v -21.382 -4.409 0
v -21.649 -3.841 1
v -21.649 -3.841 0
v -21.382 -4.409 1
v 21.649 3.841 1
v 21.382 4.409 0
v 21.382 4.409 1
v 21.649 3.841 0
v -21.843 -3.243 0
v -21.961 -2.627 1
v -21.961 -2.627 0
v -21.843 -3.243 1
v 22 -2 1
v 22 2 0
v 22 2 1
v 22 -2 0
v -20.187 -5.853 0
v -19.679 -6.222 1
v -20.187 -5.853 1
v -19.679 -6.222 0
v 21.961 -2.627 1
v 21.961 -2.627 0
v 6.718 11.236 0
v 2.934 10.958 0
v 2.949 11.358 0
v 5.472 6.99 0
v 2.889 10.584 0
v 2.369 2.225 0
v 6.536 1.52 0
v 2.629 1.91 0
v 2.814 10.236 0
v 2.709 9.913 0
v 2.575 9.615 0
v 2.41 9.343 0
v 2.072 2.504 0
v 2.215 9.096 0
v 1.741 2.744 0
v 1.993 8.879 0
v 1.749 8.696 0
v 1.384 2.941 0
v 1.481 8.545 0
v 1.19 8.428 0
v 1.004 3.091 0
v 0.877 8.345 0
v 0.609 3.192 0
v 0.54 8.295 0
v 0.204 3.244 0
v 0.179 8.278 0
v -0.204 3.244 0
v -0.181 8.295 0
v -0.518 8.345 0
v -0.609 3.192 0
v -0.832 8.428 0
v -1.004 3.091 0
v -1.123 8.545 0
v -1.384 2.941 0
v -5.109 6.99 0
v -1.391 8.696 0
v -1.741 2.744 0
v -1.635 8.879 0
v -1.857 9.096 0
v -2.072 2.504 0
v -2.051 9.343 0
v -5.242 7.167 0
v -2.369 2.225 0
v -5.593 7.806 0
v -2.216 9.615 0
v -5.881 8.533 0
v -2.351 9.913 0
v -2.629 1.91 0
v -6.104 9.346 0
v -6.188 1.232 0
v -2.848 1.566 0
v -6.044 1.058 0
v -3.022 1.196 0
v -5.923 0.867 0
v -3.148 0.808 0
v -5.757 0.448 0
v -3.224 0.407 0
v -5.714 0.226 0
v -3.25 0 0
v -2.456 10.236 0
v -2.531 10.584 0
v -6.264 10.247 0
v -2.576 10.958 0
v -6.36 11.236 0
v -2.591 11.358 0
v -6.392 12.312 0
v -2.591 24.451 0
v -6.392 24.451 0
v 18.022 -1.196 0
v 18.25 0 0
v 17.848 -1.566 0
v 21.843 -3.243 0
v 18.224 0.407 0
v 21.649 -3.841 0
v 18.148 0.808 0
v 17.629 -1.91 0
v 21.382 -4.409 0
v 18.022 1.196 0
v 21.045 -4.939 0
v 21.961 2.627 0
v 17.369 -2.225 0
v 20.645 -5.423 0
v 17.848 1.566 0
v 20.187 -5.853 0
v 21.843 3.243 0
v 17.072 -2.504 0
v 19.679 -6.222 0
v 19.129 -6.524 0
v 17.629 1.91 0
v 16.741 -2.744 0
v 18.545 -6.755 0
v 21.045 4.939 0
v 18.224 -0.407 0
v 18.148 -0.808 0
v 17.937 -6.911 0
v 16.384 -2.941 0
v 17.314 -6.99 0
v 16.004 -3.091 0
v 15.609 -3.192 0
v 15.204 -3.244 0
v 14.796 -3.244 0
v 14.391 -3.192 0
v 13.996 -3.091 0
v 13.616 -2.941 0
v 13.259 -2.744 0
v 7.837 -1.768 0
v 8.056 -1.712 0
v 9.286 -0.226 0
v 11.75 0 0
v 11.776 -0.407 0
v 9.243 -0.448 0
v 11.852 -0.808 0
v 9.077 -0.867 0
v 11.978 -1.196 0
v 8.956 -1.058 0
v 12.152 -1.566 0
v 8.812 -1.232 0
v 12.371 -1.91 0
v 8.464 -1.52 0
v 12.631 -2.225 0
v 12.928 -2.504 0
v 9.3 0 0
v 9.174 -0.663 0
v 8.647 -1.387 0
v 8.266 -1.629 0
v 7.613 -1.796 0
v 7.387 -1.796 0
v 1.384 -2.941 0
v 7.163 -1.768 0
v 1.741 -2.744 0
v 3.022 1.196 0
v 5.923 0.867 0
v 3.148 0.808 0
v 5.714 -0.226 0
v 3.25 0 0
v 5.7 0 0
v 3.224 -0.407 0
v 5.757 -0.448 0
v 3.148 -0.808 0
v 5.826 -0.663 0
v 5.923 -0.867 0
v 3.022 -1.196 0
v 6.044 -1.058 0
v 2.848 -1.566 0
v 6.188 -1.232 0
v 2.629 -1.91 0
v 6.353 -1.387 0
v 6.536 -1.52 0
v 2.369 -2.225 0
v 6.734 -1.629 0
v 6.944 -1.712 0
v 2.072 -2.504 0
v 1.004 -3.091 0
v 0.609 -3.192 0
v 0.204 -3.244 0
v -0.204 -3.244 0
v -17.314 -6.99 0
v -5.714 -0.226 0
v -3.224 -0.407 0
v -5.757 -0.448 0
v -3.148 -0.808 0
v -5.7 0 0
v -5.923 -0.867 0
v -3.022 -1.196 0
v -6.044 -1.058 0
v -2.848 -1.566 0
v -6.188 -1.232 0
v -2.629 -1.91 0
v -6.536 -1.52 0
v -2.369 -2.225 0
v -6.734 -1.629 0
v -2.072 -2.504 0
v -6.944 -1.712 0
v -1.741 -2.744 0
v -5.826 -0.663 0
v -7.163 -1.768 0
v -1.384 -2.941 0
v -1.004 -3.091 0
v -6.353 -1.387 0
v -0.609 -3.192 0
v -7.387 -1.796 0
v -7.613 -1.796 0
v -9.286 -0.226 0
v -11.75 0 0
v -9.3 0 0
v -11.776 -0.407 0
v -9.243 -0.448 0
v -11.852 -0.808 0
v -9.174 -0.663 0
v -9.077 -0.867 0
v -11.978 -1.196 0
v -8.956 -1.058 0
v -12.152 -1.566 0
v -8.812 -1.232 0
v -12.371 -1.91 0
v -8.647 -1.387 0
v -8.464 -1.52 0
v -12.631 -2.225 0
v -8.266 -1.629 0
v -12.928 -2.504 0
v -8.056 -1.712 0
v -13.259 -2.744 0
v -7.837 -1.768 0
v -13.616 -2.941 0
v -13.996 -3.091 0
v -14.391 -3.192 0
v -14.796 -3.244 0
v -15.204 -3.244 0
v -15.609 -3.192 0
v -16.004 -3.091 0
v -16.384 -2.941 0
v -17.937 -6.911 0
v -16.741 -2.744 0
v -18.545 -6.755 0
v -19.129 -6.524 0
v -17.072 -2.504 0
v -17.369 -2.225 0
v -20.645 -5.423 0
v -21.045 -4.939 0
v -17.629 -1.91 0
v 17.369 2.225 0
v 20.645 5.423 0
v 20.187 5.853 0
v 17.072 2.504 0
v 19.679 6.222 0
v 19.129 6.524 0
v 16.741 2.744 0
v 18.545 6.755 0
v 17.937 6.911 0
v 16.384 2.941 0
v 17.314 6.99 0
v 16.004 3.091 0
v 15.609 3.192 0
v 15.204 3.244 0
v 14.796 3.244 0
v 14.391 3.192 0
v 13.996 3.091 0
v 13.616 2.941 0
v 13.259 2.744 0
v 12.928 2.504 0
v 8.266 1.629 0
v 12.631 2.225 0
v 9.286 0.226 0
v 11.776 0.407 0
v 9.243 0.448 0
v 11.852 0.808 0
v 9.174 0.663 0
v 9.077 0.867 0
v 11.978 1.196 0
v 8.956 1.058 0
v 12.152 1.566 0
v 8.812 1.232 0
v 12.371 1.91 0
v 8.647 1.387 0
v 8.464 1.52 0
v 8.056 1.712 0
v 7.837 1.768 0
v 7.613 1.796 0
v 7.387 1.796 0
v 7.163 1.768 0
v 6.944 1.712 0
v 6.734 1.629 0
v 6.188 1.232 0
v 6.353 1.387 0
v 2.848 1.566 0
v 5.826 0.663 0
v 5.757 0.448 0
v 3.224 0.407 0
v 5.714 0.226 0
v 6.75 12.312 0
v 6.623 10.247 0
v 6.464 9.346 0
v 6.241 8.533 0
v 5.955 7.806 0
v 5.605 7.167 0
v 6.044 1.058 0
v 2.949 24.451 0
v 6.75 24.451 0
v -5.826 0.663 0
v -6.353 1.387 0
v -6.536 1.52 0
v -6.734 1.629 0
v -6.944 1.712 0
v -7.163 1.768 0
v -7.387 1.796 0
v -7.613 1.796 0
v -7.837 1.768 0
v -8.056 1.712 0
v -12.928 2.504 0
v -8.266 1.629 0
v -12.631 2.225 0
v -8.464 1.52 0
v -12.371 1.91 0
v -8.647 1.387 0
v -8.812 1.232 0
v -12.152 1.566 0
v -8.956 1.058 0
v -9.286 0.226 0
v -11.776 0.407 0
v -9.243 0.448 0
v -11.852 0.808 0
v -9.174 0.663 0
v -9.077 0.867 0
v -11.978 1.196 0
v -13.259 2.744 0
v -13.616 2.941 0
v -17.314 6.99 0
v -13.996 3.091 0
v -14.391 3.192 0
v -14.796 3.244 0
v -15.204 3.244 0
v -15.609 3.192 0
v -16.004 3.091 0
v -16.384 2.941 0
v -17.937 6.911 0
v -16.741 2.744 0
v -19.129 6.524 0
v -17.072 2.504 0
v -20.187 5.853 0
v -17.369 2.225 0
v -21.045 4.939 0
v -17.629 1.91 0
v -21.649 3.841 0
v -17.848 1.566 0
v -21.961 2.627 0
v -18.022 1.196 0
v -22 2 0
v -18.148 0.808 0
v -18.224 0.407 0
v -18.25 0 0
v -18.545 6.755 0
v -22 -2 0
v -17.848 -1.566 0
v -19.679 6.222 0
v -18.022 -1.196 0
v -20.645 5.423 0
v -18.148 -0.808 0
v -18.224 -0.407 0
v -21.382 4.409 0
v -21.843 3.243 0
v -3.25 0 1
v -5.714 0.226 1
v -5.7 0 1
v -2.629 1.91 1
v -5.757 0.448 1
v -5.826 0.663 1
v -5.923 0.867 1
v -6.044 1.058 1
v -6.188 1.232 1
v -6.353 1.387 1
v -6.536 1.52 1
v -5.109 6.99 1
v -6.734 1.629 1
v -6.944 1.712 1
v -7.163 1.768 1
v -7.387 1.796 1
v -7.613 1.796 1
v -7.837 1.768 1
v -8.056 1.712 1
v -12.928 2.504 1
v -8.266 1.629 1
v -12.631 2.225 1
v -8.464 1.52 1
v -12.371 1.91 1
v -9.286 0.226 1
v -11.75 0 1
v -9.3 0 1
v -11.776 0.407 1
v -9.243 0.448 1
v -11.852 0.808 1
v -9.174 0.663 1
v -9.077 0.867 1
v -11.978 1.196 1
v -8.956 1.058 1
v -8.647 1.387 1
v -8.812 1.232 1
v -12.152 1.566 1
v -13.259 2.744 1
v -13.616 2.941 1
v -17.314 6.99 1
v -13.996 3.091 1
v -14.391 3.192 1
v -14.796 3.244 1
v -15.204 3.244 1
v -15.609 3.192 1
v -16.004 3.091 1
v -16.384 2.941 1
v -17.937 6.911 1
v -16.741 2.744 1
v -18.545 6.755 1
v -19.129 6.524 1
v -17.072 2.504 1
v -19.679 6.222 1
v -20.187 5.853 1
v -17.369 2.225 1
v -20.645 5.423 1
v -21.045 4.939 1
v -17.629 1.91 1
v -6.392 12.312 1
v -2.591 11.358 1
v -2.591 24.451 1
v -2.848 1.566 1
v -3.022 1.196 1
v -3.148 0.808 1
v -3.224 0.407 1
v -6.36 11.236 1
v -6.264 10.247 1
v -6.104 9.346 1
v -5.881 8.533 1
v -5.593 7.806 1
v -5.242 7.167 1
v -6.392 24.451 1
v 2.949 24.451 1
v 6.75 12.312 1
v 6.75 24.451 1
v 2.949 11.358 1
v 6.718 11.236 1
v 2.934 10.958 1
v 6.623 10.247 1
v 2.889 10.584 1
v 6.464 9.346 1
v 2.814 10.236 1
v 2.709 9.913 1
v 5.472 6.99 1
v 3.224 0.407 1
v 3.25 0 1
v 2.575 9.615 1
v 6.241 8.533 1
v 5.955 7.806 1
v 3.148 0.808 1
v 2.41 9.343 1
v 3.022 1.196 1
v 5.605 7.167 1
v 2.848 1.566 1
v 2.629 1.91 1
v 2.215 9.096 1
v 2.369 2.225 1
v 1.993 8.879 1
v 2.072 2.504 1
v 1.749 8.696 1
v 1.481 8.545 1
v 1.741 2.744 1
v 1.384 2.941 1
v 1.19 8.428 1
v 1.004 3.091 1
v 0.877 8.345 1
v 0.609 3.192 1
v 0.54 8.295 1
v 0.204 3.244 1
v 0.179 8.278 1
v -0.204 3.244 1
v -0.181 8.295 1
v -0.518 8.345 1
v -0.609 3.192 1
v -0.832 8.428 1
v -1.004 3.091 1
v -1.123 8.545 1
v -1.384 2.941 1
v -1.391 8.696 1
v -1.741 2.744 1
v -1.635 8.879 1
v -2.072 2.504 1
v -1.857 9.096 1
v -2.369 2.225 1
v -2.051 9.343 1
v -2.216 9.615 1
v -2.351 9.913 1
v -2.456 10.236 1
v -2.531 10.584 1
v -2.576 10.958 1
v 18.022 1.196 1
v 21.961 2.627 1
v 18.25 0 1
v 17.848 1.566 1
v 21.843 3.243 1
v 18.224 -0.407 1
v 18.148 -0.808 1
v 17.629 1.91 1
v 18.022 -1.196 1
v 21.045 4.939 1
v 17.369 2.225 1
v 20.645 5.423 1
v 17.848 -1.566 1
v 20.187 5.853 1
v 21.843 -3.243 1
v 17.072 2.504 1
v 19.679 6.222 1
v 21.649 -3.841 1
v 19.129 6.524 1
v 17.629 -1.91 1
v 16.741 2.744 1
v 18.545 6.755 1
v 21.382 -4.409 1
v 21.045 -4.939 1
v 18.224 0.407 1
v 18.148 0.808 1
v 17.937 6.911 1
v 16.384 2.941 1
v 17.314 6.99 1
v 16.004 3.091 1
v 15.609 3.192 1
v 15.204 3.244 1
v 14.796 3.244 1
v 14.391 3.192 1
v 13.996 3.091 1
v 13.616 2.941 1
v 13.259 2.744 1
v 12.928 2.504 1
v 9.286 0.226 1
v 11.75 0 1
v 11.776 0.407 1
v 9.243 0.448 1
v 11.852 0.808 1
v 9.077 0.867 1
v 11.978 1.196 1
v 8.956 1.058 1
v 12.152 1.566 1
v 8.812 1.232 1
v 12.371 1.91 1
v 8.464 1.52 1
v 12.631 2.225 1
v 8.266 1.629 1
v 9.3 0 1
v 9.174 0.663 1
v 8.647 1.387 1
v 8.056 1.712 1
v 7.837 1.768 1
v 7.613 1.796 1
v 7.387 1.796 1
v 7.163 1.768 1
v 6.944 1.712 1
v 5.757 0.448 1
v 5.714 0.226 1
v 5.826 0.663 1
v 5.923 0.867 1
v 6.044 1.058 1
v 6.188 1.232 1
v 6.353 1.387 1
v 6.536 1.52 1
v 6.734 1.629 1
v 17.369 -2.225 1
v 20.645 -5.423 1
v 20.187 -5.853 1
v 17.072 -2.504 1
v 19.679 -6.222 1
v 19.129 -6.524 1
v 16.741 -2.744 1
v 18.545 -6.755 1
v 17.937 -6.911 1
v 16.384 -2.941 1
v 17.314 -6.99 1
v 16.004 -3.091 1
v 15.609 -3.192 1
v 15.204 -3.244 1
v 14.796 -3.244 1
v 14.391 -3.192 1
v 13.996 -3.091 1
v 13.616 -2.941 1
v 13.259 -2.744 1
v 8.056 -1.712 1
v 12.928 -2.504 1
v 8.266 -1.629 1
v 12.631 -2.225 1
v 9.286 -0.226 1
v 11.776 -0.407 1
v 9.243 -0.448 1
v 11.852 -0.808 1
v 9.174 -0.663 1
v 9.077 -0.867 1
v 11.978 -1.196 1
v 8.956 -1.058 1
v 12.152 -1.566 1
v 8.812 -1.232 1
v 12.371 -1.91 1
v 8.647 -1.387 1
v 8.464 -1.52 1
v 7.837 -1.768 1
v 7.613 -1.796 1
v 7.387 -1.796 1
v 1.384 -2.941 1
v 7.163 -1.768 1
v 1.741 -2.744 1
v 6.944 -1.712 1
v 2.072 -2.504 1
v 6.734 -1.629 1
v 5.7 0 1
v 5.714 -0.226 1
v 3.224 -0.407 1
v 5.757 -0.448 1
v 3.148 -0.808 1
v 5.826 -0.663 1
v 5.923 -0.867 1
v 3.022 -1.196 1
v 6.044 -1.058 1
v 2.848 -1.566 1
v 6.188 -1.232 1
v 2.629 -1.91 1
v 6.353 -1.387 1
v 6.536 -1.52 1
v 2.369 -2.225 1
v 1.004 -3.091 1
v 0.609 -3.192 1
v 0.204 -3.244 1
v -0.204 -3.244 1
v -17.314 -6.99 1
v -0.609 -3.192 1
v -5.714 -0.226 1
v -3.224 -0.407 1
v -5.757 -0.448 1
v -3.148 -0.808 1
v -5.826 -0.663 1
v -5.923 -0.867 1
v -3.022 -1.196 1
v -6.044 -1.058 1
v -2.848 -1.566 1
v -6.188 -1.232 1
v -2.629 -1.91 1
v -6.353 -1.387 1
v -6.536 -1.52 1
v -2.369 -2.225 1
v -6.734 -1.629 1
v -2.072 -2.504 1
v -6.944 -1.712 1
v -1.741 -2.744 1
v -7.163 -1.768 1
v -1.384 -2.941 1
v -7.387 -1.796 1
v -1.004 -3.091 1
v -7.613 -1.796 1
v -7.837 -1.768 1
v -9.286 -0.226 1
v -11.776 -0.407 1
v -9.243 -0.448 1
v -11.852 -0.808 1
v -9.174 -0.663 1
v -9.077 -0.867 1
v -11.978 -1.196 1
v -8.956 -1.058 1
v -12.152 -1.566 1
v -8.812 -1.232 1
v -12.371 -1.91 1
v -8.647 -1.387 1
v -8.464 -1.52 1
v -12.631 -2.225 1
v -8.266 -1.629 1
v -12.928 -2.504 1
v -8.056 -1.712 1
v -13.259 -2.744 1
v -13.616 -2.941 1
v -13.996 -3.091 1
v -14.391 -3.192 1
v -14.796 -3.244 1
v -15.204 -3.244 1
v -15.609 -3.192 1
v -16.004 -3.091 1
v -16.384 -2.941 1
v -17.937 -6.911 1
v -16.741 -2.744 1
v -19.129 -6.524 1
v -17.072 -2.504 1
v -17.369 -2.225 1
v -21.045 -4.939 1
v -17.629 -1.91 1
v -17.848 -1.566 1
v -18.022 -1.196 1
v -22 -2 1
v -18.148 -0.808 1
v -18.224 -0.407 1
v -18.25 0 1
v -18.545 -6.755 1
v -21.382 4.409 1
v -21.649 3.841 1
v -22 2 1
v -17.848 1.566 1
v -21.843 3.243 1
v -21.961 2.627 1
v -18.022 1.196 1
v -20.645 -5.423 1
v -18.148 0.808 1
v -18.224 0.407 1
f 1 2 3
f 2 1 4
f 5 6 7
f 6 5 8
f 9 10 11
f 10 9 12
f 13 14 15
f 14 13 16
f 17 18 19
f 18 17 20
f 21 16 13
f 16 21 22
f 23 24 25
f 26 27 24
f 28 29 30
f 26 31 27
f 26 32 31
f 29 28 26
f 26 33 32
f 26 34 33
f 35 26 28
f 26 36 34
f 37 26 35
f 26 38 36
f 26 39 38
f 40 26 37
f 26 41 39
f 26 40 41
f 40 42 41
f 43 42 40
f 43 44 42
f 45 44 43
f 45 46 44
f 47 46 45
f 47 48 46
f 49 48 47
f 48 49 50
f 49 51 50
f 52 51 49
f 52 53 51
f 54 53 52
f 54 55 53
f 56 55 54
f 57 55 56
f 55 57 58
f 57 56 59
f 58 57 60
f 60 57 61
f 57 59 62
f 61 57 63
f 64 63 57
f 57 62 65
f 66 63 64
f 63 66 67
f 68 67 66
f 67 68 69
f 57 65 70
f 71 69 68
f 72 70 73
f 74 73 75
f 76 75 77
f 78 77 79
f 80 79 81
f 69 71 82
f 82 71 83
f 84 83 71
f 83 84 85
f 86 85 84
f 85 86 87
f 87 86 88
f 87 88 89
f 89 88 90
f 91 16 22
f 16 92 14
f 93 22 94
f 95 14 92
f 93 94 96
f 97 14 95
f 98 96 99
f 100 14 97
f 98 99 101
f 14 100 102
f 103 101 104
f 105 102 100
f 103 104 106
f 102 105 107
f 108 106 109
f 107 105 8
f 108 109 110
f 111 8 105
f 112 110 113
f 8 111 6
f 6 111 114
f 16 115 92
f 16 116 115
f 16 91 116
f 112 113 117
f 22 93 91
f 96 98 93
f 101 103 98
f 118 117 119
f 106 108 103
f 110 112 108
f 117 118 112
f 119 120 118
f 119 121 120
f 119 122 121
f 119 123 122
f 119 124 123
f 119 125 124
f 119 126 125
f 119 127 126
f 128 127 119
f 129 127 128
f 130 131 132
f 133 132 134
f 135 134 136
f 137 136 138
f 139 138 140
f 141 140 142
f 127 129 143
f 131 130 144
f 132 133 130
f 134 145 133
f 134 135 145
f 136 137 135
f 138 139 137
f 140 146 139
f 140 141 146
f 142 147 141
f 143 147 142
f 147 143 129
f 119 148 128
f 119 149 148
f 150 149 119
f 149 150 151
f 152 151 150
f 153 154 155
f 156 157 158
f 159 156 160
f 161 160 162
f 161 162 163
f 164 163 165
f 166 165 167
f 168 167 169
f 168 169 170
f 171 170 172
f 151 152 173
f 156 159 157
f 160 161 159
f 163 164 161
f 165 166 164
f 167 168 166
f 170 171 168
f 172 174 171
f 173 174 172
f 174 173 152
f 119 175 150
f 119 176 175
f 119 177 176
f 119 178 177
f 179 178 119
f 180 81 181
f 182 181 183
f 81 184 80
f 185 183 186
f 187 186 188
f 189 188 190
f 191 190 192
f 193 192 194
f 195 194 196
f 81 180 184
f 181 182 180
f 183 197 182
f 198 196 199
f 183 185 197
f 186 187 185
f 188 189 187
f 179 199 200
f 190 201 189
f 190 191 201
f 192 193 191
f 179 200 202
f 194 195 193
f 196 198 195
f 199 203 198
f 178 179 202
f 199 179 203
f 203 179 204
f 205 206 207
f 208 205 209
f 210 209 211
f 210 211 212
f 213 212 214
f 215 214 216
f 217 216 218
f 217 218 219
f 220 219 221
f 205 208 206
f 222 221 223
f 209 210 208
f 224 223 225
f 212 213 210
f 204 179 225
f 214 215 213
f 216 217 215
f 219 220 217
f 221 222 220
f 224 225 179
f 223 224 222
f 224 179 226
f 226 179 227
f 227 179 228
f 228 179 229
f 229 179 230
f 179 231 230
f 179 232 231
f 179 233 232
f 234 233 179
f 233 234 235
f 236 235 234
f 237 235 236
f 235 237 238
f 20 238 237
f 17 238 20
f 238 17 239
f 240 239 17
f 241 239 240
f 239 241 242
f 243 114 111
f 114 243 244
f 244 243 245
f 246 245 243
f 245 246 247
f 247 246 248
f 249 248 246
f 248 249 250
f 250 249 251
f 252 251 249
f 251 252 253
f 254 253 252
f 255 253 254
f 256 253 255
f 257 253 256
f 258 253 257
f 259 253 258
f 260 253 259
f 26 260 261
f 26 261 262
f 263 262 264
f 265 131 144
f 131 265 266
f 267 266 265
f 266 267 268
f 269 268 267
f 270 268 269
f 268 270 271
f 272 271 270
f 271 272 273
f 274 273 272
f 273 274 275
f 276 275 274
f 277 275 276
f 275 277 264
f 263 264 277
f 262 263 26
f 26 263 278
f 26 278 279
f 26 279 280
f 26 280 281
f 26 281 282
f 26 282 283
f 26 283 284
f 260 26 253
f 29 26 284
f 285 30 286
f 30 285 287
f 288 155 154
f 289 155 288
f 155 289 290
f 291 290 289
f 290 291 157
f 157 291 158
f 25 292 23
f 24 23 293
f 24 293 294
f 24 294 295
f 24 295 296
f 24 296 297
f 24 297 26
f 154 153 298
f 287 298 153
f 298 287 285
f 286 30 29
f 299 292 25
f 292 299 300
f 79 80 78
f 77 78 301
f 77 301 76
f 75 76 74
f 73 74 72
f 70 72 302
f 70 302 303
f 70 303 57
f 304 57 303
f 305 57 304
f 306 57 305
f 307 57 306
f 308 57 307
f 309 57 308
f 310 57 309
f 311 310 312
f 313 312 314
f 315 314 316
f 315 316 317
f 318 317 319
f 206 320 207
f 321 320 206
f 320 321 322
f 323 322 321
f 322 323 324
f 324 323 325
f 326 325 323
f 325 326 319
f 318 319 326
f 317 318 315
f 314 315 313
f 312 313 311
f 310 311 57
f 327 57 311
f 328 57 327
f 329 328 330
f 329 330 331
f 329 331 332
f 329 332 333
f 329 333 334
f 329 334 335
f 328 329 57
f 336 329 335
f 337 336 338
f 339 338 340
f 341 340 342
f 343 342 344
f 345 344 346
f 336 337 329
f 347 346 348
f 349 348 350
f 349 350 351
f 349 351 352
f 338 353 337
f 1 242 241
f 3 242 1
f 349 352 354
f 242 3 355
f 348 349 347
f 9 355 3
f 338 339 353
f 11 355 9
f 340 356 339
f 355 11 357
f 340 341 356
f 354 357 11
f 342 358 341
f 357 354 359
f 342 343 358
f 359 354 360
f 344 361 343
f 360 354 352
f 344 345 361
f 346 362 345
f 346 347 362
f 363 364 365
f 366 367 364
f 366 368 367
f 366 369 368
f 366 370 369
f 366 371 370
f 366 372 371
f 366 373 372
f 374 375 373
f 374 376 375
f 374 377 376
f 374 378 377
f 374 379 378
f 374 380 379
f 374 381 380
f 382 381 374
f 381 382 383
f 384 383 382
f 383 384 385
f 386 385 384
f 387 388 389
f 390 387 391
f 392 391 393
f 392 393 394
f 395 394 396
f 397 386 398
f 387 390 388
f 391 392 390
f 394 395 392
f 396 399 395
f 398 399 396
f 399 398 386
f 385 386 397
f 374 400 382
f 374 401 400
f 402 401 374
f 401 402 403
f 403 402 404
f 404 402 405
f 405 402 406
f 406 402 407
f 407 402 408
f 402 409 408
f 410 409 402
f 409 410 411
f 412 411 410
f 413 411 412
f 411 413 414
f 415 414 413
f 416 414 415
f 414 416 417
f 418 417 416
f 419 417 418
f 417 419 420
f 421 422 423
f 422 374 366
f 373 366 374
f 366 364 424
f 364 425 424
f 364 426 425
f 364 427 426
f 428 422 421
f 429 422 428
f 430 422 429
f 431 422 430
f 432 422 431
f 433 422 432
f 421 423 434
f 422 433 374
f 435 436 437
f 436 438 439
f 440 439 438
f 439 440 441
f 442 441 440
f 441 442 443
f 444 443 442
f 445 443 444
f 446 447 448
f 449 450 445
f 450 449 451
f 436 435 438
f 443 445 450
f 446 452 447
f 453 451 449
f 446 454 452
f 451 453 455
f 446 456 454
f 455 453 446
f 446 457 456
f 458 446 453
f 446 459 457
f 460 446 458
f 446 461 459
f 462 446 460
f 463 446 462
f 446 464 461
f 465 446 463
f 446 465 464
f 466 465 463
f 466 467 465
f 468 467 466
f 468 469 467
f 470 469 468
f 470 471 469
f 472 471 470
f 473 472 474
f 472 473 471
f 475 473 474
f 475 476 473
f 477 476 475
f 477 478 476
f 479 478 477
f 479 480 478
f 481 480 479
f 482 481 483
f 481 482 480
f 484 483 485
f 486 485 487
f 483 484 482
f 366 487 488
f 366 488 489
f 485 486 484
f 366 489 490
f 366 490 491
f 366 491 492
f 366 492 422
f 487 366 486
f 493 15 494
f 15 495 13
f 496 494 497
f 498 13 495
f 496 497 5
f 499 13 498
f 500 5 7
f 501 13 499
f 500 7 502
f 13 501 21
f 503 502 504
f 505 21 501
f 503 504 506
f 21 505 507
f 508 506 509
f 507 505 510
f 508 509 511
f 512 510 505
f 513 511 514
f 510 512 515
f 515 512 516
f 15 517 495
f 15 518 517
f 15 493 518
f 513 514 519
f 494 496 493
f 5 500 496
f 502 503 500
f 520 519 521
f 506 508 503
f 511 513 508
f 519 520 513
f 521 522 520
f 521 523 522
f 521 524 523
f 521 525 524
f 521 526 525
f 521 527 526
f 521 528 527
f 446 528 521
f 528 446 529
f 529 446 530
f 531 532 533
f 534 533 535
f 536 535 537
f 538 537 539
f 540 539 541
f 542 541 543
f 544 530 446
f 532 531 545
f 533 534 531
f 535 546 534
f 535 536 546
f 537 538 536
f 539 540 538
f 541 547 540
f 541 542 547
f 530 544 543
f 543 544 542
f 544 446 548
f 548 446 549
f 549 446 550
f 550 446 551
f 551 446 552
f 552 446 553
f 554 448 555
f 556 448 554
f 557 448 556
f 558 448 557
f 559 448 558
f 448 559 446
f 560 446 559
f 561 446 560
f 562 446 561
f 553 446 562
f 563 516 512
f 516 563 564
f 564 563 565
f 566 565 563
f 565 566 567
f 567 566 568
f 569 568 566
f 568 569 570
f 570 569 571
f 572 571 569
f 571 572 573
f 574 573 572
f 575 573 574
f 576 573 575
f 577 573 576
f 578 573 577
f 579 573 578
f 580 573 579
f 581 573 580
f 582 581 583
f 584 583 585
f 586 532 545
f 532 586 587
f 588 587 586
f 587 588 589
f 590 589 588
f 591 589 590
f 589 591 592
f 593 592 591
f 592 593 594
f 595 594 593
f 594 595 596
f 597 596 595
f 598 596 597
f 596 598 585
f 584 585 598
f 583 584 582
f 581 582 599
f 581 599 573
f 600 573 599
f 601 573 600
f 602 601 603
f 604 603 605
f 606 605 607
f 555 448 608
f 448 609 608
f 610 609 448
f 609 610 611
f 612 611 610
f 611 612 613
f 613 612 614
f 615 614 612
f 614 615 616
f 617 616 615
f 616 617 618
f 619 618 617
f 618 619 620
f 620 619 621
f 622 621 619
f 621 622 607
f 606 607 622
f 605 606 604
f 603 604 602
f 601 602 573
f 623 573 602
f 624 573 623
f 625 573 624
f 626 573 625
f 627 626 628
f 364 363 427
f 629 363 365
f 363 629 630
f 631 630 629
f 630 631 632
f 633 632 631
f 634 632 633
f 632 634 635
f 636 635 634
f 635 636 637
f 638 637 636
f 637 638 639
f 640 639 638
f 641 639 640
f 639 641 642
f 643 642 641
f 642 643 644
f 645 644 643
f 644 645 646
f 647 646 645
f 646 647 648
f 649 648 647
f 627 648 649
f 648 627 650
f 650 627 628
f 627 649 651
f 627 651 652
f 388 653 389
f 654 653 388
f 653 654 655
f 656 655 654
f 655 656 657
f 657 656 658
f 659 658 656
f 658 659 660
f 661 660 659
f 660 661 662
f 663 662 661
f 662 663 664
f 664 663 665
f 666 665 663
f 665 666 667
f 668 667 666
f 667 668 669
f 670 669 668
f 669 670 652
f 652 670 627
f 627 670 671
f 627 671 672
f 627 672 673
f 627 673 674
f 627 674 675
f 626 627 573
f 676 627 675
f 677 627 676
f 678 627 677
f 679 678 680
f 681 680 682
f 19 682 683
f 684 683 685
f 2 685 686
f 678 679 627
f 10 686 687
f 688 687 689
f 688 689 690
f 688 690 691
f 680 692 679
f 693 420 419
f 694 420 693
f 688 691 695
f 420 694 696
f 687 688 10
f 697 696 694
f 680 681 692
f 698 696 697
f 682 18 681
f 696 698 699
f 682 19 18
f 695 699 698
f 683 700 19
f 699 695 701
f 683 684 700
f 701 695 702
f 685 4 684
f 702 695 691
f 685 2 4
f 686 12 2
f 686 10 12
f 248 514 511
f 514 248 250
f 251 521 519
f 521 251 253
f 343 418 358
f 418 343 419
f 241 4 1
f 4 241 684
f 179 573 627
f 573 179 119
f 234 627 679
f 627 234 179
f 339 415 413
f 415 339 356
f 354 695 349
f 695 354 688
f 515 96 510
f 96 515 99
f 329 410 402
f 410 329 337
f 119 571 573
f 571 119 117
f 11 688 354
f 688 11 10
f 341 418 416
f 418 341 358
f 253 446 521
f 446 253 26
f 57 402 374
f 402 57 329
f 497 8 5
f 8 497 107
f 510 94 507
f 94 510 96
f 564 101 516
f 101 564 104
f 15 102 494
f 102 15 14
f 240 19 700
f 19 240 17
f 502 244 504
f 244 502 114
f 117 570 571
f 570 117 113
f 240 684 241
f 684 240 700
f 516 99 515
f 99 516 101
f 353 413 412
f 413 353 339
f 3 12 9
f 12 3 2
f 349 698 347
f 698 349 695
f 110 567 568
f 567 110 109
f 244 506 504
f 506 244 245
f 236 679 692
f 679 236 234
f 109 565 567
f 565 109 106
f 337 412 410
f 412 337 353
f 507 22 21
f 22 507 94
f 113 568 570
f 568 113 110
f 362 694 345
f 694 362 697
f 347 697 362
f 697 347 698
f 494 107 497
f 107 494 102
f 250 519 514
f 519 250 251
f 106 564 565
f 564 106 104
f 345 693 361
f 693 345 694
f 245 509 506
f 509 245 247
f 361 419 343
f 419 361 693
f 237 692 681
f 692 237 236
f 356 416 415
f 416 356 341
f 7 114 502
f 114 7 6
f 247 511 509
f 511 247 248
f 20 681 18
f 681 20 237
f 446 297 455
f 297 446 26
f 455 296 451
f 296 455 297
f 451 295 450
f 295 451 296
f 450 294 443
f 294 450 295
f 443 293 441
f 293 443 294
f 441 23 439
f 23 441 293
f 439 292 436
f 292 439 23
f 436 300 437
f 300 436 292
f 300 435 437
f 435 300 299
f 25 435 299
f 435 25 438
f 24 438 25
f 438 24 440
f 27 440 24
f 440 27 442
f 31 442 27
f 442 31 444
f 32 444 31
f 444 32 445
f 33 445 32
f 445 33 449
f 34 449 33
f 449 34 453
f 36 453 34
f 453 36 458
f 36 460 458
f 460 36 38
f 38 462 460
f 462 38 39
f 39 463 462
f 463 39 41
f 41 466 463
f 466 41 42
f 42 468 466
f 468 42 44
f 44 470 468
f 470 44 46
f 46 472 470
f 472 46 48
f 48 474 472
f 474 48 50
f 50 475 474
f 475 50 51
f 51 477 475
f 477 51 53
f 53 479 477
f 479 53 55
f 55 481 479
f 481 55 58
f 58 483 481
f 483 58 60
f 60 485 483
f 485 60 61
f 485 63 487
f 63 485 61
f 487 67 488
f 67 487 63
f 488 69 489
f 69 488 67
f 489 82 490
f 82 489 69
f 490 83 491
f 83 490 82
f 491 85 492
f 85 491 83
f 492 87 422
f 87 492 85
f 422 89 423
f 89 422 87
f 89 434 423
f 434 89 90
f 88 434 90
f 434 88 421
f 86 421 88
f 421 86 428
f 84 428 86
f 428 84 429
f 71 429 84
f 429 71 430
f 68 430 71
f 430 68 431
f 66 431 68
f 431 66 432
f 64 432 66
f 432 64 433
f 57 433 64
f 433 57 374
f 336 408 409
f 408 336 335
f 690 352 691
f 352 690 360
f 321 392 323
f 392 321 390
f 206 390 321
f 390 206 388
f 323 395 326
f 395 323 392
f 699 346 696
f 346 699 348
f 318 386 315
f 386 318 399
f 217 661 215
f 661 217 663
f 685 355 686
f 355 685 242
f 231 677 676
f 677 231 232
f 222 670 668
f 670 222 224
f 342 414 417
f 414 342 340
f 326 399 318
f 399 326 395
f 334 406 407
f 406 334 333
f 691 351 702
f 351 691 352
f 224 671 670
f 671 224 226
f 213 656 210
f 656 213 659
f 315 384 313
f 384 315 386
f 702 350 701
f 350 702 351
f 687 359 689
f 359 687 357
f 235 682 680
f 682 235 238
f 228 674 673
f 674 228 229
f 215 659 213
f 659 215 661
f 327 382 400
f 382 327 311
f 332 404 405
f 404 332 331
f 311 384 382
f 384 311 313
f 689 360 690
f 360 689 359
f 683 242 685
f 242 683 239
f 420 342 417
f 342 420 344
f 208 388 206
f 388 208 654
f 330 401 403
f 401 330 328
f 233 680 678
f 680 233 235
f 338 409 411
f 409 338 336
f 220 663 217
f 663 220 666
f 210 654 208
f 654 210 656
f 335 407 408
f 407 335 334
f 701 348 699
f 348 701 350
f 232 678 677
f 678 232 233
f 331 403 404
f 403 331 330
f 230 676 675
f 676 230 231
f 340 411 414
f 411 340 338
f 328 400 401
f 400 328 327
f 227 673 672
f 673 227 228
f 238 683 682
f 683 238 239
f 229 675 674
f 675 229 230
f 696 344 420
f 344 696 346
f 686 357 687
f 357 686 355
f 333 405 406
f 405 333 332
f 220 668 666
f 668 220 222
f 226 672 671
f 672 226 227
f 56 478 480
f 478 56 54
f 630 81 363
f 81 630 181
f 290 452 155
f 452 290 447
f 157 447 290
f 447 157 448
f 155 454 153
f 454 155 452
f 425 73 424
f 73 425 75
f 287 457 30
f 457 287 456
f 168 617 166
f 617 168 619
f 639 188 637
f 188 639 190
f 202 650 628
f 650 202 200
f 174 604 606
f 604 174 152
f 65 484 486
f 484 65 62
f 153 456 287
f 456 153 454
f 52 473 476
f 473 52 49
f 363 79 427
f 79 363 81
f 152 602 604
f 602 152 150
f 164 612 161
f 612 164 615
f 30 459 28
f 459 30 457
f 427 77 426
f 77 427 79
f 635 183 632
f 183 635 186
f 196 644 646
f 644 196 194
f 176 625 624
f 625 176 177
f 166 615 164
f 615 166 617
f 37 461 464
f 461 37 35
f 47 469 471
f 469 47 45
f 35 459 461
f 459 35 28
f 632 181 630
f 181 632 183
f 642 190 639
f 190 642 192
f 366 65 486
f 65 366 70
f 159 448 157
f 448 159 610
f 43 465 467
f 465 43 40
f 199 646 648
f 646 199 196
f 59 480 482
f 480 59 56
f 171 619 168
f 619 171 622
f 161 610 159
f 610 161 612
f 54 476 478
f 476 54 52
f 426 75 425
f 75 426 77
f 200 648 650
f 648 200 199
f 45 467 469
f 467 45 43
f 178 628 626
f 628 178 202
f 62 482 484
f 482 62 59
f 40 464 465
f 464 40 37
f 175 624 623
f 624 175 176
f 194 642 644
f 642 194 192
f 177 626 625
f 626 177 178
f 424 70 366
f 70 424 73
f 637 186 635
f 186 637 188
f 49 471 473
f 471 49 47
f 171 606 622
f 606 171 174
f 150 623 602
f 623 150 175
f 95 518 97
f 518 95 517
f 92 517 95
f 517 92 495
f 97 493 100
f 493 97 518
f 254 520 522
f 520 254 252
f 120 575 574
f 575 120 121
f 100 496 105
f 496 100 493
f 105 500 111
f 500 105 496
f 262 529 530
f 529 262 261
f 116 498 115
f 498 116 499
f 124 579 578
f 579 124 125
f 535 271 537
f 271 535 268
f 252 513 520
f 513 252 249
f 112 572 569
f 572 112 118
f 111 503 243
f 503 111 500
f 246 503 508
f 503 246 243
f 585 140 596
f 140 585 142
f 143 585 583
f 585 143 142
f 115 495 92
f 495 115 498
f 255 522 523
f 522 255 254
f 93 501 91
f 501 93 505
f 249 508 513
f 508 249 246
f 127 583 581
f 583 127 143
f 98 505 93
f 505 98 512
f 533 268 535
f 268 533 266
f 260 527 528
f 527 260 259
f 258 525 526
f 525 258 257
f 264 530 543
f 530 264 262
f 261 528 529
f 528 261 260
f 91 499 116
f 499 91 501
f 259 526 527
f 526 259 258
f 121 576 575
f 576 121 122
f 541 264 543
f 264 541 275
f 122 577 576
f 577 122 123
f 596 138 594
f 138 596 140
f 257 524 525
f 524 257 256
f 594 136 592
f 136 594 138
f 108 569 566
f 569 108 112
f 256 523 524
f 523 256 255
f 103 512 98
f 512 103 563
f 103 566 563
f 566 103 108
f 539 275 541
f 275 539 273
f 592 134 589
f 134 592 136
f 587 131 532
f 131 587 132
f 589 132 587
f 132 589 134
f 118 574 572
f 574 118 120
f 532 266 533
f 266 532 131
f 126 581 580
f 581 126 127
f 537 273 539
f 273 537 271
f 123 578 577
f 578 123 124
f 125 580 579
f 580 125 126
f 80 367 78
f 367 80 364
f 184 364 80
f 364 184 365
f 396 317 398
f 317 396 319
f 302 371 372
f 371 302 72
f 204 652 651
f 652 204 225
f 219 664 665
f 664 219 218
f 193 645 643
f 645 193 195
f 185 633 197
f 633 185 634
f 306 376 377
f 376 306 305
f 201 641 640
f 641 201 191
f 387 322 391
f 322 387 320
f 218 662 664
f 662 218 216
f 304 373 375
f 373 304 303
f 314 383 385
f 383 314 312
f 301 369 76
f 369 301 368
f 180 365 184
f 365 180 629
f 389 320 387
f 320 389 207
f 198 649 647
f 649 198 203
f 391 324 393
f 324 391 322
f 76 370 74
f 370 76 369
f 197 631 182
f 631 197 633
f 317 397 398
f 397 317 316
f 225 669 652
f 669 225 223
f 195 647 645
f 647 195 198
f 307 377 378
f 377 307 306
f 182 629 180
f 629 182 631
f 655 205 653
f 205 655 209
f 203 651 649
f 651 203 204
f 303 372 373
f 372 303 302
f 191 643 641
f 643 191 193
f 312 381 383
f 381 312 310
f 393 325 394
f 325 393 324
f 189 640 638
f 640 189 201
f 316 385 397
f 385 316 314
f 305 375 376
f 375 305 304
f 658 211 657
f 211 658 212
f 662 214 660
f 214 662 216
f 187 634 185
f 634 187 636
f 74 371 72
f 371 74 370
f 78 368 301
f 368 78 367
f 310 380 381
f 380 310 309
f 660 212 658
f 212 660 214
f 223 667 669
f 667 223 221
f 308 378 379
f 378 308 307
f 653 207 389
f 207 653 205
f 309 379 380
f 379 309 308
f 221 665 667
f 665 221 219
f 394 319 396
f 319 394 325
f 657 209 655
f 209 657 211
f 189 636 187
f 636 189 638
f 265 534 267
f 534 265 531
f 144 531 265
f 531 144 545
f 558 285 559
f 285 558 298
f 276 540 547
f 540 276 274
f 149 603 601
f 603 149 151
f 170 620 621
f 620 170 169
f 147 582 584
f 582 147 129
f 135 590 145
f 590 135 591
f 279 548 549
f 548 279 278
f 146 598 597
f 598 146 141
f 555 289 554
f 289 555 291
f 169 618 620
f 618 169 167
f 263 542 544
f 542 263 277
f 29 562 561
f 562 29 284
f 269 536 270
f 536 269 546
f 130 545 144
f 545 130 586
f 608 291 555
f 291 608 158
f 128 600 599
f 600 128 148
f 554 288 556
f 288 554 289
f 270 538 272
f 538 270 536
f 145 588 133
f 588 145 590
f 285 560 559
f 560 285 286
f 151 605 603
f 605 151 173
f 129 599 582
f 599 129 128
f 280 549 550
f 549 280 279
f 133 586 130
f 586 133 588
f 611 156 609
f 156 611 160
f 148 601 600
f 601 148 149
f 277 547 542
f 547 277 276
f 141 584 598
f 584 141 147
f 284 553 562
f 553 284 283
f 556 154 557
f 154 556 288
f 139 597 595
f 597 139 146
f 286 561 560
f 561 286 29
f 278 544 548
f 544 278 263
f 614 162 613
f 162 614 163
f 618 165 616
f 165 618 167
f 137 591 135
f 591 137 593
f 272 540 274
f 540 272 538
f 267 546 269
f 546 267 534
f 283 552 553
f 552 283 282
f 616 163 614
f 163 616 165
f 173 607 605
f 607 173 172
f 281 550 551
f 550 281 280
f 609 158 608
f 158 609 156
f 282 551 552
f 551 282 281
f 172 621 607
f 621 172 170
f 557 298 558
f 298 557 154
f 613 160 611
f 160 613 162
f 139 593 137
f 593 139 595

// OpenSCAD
$fn = 50;


difference() {
	union() {
		hull() {
			translate(v = [-17.0000000000, 2.0000000000, 0]) {
				cylinder(h = 1, r = 5);
			}
			translate(v = [17.0000000000, 2.0000000000, 0]) {
				cylinder(h = 1, r = 5);
			}
			translate(v = [-17.0000000000, -2.0000000000, 0]) {
				cylinder(h = 1, r = 5);
			}
			translate(v = [17.0000000000, -2.0000000000, 0]) {
				cylinder(h = 1, r = 5);
			}
		}
		translate(v = [0, 24, 0]) {
			linear_extrude(height = 1) {
				text(font = "DejaVu Sans Mono:style=Bold", halign = "center", size = 19.0000000000, text = "U", valign = "top");
			}
		}
	}
	union() {
		translate(v = [-15.0000000000, 0.0000000000, 0]) {
			translate(v = [0, 0, -100]) {
				cylinder(h = 200, r = 3.2500000000);
			}
		}
		translate(v = [0, 0, -100]) {
			cylinder(h = 200, r = 3.2500000000);
		}
		translate(v = [15.0000000000, 0.0000000000, 0]) {
			translate(v = [0, 0, -100]) {
				cylinder(h = 200, r = 3.2500000000);
			}
		}
		translate(v = [-15.0000000000, 0.0000000000, 0]) {
			translate(v = [0, 0, -100]) {
				cylinder(h = 200, r = 1.8000000000);
			}
		}
		translate(v = [-7.5000000000, 0.0000000000, 0]) {
			translate(v = [0, 0, -100]) {
				cylinder(h = 200, r = 1.8000000000);
			}
		}
		translate(v = [0, 0, -100]) {
			cylinder(h = 200, r = 1.8000000000);
		}
		translate(v = [7.5000000000, 0.0000000000, 0]) {
			translate(v = [0, 0, -100]) {
				cylinder(h = 200, r = 1.8000000000);
			}
		}
		translate(v = [15.0000000000, 0.0000000000, 0]) {
			translate(v = [0, 0, -100]) {
				cylinder(h = 200, r = 1.8000000000);
			}
		}
	}
}
